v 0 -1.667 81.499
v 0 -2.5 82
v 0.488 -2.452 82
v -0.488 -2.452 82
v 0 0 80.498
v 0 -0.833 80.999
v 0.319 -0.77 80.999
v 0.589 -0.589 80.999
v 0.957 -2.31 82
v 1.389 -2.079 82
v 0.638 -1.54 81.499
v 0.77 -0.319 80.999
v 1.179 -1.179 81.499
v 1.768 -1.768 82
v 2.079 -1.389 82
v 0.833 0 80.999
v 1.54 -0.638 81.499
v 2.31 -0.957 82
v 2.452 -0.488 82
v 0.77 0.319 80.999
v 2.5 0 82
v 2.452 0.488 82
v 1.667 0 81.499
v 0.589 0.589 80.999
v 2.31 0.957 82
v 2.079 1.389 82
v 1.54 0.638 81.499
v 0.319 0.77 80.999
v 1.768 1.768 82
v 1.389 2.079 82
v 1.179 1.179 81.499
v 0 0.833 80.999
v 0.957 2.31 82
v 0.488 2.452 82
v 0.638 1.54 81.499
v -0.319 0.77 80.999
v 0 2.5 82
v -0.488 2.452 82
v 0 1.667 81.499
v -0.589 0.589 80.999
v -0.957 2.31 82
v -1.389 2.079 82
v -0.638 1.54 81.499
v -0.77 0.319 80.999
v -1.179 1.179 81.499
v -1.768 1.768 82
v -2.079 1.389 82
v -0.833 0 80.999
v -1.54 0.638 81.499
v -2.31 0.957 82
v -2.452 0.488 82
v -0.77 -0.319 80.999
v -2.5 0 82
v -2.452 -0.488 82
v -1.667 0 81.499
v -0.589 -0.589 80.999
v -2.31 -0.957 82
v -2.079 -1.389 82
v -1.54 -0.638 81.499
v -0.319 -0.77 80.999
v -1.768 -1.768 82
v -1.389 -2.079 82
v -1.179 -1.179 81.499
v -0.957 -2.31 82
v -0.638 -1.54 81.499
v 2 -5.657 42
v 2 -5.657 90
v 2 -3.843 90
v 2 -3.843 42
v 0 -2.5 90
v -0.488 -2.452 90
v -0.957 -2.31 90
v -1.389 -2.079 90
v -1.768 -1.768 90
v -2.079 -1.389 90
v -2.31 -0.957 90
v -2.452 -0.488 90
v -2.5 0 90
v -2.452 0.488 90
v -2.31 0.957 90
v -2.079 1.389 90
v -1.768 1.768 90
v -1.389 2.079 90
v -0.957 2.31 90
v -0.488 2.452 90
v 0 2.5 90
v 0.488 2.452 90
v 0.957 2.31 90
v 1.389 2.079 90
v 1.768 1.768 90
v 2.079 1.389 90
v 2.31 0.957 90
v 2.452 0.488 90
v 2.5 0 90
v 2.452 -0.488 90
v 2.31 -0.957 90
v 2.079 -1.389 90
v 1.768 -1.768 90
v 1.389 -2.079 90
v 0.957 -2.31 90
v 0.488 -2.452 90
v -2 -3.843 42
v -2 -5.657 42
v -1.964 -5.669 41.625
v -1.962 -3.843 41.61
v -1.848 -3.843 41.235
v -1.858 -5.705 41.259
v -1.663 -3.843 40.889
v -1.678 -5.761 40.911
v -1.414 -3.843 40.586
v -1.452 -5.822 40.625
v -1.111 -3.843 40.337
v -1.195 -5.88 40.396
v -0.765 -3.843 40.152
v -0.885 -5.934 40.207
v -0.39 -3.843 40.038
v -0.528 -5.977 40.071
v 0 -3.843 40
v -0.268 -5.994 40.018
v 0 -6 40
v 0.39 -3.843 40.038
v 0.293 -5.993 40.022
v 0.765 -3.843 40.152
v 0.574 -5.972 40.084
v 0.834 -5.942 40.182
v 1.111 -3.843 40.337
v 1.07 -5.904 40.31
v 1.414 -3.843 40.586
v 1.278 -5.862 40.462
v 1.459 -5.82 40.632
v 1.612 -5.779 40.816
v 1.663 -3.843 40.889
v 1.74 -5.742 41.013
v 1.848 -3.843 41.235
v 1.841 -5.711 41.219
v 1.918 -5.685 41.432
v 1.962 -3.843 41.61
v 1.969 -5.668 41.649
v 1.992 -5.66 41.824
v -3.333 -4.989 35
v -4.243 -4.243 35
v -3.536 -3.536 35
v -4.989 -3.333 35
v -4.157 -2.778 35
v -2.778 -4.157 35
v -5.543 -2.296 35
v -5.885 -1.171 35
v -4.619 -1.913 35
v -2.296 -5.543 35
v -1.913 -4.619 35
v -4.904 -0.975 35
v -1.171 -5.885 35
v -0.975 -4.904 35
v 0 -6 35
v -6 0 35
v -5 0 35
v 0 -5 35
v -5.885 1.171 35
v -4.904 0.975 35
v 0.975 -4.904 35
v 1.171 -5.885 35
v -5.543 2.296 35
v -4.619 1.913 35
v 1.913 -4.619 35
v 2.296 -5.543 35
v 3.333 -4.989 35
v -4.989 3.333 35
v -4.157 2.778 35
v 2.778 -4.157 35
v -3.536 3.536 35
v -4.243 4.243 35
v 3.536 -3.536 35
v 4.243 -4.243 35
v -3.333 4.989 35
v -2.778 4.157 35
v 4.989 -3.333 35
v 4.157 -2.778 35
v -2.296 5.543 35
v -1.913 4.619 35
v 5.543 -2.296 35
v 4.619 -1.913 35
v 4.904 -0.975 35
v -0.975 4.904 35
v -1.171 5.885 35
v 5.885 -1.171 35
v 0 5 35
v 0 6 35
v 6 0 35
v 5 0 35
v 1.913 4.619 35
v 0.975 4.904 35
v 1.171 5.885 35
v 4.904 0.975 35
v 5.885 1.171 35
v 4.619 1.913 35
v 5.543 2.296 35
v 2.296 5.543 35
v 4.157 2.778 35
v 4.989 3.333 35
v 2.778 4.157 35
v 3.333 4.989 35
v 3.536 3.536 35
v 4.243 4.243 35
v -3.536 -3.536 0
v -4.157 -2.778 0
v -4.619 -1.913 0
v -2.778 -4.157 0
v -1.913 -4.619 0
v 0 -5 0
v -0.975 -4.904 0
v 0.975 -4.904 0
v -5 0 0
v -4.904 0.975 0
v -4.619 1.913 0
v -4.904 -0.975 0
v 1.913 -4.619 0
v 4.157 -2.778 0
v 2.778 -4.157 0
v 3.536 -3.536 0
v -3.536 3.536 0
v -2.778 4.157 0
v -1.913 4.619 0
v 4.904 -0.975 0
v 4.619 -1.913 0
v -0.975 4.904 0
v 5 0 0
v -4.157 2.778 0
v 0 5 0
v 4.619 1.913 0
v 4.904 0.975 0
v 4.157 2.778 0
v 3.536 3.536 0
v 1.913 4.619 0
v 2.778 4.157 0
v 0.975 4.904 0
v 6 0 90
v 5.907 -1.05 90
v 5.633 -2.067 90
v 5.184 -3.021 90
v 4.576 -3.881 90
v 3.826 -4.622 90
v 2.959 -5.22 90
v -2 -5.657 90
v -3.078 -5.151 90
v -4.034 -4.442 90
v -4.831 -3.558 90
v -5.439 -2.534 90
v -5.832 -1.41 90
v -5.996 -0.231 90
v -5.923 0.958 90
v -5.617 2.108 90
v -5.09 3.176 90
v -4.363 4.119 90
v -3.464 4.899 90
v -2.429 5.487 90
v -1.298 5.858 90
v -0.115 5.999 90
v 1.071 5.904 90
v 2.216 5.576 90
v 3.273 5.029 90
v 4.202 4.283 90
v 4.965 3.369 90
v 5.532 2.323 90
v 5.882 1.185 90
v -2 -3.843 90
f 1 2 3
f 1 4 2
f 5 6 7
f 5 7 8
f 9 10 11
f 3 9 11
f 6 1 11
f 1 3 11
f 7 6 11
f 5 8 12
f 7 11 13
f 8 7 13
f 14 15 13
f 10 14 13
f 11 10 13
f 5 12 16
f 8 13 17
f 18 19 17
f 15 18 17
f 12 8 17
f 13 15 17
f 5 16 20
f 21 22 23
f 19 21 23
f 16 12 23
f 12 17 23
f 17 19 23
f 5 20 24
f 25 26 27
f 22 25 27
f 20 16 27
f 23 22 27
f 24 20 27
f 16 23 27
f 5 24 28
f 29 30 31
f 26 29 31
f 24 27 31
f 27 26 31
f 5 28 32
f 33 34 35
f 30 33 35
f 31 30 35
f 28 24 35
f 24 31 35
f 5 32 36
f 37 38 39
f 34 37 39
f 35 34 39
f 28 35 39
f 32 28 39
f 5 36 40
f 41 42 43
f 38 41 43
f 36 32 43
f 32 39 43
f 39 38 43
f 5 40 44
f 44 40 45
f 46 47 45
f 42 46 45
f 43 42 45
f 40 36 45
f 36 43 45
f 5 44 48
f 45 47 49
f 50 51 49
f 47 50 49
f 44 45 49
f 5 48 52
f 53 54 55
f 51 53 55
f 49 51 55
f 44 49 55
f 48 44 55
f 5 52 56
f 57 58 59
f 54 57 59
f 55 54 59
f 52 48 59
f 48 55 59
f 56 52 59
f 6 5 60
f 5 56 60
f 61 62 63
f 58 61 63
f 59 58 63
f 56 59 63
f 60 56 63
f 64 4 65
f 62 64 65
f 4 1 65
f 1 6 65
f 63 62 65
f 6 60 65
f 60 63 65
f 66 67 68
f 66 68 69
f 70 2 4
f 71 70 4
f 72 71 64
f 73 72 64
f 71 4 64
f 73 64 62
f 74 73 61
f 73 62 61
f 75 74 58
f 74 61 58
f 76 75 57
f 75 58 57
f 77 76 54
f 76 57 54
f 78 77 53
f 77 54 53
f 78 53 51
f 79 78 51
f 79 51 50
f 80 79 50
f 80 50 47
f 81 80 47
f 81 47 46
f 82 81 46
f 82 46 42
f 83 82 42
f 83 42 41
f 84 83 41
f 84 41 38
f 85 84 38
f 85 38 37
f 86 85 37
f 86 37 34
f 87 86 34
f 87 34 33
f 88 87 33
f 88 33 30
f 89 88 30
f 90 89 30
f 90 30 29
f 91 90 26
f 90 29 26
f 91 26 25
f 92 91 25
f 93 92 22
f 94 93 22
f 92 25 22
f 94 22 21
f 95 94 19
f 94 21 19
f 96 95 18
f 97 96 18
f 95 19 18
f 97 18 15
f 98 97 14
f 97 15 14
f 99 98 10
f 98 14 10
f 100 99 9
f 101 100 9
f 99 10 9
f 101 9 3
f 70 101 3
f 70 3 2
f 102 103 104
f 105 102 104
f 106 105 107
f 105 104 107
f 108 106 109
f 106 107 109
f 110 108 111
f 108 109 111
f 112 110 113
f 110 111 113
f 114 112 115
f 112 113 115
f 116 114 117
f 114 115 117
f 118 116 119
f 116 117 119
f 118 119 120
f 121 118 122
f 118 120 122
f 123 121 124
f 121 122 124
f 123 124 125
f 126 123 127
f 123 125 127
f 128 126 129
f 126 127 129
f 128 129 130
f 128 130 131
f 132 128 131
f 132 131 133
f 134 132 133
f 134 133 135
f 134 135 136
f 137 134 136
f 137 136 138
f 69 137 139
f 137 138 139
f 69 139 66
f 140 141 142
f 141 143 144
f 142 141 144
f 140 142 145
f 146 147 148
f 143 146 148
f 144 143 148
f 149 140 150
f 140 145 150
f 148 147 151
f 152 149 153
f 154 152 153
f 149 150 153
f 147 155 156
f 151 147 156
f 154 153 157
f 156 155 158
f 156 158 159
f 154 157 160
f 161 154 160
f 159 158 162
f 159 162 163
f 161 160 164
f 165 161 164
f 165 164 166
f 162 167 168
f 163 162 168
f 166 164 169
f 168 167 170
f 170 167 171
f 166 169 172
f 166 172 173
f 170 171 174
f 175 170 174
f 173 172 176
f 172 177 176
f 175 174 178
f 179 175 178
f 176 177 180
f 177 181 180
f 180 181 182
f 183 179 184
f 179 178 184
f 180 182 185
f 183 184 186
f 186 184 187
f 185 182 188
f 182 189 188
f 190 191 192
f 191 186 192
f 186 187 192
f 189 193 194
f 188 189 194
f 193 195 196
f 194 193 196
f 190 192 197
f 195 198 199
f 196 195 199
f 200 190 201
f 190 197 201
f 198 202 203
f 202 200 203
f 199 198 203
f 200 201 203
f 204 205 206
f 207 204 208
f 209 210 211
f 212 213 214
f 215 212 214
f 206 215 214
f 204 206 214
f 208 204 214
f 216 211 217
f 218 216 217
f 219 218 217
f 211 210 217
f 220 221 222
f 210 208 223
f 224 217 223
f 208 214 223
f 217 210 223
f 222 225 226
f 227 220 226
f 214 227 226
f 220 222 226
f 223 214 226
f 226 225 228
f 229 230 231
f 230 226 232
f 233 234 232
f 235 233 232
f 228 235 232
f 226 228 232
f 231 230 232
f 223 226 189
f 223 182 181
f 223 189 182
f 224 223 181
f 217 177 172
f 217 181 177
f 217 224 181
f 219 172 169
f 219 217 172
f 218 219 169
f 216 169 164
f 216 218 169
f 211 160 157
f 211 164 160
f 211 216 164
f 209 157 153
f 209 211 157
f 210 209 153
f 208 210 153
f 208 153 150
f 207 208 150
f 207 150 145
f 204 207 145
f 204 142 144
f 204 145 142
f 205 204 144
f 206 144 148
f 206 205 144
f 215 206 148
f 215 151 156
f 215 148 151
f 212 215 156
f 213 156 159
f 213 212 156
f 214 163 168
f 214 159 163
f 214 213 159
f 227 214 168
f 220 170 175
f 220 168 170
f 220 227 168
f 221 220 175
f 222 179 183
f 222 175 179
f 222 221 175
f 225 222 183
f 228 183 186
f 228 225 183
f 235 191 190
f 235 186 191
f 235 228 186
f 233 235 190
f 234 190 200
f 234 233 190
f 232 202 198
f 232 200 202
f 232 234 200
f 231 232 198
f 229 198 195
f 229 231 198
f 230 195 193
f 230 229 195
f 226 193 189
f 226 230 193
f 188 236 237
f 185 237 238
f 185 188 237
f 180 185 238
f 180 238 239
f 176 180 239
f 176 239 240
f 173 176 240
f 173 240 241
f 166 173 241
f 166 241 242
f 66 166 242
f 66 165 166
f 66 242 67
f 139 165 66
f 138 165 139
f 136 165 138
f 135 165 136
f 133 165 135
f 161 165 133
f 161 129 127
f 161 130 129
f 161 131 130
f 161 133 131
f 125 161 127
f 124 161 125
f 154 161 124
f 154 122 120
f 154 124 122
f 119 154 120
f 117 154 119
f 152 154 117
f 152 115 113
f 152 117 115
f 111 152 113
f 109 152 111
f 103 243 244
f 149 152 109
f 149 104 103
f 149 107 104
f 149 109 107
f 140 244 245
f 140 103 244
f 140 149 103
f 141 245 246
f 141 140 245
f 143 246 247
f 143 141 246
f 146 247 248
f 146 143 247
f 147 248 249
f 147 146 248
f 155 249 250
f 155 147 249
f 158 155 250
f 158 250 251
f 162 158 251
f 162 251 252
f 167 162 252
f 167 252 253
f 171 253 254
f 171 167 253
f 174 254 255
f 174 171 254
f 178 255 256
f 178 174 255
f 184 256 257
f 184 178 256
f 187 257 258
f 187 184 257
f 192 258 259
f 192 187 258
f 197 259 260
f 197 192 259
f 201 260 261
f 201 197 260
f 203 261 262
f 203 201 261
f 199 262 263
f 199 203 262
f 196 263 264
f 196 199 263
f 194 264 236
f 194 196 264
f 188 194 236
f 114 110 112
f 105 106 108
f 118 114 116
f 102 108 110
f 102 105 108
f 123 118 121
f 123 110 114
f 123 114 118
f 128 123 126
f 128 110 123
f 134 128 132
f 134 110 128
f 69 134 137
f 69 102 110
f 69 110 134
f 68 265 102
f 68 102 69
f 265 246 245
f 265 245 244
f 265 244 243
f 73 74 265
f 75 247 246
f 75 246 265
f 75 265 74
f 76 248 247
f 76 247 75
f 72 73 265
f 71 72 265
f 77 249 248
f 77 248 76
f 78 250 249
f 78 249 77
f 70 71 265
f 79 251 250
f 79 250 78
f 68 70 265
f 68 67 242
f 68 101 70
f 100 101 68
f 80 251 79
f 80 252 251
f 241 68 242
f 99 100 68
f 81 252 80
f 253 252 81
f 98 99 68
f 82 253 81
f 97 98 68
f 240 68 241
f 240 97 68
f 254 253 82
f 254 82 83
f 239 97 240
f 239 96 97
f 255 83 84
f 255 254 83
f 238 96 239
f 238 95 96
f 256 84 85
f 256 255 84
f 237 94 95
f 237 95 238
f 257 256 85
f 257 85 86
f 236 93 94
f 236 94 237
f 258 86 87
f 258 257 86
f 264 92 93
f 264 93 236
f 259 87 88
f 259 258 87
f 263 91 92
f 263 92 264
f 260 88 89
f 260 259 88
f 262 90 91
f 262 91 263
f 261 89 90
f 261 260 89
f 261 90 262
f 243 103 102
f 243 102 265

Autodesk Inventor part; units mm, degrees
ref_plane "YZ Plane" through (0, 0, 0) normal (1, 0, 0) x (0, 1, 0)
ref_plane "XZ Plane" through (0, 0, 0) normal (0, 1, 0) x (-1, 0, 0)
sketch "スケッチ1" plane through (0, 0, 0) normal (0, 0, 1) x (1, 0, 0)
  circle A0 centre (0, 0) radius 5
  dimension "d0" = 10
extrude "押し出し1" add sketch "スケッチ1" along normal blind 35
thread "ねじ1" size "M10x1.5" class "6g" standard "ANSI Metric M Profile" length 10
sketch "スケッチ2" plane through (0, 0, 35) normal (0, 0, 1) x (1, 0, 0)
  circle A0 centre (0, 0) radius 6
  dimension "d5" = 12
extrude "押し出し2" add sketch "スケッチ2" along normal blind 55
sketch "スケッチ6" plane through (0, 0, 90) normal (0, 0, 1) x (1, 0, 0)
  line L0 (0, 0) -> (0, -6) construction
  circle A0 centre (0, 0) radius 6 projected
ref_plane "作業平面5" through (0, -6, 90) normal (0, -1, 0) x (1, 0, 0)
sketch "スケッチ8" plane through (0, -6, 90) normal (0, -1, 0) x (1, 0, 0)
  line L0 (6, 0) -> (-6, 0) projected
  line L1 (-2, 0) -> (2, 0)
  line L2 (-2, 0) -> (2, 0)
  line L3 (2, 0) -> (2, -48)
  line L4 (-2, -48) -> (-2, 0)
  arc A0 (-2, -48) -> (2, -48) centre (0, -48) ccw
  point P0 (0, -90)
  point P1 (0, 0)
  dimension "d11" = 2
  dimension "d17" = 48
  dimension "d29" = 2
extrude "押し出し3" cut sketch "スケッチ8" against normal blind 2.157
sketch "スケッチ9" plane through (0, 0, 90) normal (0, 0, 1) x (1, 0, 0)
  point P0 (0, 0)
  point P1 (0, 0)
hole "穴1" at (0, 0, 90) direction (0, 0, -1) diameter 5 depth 8 tip angle 118
thread "ねじ2" size "Rc 2 1/2" standard "ISO Taper Internal" full length
thread "ねじ3" size "M5x0.8" class "6H" standard "ANSI Metric M Profile" full length
properties part number "正しい"
